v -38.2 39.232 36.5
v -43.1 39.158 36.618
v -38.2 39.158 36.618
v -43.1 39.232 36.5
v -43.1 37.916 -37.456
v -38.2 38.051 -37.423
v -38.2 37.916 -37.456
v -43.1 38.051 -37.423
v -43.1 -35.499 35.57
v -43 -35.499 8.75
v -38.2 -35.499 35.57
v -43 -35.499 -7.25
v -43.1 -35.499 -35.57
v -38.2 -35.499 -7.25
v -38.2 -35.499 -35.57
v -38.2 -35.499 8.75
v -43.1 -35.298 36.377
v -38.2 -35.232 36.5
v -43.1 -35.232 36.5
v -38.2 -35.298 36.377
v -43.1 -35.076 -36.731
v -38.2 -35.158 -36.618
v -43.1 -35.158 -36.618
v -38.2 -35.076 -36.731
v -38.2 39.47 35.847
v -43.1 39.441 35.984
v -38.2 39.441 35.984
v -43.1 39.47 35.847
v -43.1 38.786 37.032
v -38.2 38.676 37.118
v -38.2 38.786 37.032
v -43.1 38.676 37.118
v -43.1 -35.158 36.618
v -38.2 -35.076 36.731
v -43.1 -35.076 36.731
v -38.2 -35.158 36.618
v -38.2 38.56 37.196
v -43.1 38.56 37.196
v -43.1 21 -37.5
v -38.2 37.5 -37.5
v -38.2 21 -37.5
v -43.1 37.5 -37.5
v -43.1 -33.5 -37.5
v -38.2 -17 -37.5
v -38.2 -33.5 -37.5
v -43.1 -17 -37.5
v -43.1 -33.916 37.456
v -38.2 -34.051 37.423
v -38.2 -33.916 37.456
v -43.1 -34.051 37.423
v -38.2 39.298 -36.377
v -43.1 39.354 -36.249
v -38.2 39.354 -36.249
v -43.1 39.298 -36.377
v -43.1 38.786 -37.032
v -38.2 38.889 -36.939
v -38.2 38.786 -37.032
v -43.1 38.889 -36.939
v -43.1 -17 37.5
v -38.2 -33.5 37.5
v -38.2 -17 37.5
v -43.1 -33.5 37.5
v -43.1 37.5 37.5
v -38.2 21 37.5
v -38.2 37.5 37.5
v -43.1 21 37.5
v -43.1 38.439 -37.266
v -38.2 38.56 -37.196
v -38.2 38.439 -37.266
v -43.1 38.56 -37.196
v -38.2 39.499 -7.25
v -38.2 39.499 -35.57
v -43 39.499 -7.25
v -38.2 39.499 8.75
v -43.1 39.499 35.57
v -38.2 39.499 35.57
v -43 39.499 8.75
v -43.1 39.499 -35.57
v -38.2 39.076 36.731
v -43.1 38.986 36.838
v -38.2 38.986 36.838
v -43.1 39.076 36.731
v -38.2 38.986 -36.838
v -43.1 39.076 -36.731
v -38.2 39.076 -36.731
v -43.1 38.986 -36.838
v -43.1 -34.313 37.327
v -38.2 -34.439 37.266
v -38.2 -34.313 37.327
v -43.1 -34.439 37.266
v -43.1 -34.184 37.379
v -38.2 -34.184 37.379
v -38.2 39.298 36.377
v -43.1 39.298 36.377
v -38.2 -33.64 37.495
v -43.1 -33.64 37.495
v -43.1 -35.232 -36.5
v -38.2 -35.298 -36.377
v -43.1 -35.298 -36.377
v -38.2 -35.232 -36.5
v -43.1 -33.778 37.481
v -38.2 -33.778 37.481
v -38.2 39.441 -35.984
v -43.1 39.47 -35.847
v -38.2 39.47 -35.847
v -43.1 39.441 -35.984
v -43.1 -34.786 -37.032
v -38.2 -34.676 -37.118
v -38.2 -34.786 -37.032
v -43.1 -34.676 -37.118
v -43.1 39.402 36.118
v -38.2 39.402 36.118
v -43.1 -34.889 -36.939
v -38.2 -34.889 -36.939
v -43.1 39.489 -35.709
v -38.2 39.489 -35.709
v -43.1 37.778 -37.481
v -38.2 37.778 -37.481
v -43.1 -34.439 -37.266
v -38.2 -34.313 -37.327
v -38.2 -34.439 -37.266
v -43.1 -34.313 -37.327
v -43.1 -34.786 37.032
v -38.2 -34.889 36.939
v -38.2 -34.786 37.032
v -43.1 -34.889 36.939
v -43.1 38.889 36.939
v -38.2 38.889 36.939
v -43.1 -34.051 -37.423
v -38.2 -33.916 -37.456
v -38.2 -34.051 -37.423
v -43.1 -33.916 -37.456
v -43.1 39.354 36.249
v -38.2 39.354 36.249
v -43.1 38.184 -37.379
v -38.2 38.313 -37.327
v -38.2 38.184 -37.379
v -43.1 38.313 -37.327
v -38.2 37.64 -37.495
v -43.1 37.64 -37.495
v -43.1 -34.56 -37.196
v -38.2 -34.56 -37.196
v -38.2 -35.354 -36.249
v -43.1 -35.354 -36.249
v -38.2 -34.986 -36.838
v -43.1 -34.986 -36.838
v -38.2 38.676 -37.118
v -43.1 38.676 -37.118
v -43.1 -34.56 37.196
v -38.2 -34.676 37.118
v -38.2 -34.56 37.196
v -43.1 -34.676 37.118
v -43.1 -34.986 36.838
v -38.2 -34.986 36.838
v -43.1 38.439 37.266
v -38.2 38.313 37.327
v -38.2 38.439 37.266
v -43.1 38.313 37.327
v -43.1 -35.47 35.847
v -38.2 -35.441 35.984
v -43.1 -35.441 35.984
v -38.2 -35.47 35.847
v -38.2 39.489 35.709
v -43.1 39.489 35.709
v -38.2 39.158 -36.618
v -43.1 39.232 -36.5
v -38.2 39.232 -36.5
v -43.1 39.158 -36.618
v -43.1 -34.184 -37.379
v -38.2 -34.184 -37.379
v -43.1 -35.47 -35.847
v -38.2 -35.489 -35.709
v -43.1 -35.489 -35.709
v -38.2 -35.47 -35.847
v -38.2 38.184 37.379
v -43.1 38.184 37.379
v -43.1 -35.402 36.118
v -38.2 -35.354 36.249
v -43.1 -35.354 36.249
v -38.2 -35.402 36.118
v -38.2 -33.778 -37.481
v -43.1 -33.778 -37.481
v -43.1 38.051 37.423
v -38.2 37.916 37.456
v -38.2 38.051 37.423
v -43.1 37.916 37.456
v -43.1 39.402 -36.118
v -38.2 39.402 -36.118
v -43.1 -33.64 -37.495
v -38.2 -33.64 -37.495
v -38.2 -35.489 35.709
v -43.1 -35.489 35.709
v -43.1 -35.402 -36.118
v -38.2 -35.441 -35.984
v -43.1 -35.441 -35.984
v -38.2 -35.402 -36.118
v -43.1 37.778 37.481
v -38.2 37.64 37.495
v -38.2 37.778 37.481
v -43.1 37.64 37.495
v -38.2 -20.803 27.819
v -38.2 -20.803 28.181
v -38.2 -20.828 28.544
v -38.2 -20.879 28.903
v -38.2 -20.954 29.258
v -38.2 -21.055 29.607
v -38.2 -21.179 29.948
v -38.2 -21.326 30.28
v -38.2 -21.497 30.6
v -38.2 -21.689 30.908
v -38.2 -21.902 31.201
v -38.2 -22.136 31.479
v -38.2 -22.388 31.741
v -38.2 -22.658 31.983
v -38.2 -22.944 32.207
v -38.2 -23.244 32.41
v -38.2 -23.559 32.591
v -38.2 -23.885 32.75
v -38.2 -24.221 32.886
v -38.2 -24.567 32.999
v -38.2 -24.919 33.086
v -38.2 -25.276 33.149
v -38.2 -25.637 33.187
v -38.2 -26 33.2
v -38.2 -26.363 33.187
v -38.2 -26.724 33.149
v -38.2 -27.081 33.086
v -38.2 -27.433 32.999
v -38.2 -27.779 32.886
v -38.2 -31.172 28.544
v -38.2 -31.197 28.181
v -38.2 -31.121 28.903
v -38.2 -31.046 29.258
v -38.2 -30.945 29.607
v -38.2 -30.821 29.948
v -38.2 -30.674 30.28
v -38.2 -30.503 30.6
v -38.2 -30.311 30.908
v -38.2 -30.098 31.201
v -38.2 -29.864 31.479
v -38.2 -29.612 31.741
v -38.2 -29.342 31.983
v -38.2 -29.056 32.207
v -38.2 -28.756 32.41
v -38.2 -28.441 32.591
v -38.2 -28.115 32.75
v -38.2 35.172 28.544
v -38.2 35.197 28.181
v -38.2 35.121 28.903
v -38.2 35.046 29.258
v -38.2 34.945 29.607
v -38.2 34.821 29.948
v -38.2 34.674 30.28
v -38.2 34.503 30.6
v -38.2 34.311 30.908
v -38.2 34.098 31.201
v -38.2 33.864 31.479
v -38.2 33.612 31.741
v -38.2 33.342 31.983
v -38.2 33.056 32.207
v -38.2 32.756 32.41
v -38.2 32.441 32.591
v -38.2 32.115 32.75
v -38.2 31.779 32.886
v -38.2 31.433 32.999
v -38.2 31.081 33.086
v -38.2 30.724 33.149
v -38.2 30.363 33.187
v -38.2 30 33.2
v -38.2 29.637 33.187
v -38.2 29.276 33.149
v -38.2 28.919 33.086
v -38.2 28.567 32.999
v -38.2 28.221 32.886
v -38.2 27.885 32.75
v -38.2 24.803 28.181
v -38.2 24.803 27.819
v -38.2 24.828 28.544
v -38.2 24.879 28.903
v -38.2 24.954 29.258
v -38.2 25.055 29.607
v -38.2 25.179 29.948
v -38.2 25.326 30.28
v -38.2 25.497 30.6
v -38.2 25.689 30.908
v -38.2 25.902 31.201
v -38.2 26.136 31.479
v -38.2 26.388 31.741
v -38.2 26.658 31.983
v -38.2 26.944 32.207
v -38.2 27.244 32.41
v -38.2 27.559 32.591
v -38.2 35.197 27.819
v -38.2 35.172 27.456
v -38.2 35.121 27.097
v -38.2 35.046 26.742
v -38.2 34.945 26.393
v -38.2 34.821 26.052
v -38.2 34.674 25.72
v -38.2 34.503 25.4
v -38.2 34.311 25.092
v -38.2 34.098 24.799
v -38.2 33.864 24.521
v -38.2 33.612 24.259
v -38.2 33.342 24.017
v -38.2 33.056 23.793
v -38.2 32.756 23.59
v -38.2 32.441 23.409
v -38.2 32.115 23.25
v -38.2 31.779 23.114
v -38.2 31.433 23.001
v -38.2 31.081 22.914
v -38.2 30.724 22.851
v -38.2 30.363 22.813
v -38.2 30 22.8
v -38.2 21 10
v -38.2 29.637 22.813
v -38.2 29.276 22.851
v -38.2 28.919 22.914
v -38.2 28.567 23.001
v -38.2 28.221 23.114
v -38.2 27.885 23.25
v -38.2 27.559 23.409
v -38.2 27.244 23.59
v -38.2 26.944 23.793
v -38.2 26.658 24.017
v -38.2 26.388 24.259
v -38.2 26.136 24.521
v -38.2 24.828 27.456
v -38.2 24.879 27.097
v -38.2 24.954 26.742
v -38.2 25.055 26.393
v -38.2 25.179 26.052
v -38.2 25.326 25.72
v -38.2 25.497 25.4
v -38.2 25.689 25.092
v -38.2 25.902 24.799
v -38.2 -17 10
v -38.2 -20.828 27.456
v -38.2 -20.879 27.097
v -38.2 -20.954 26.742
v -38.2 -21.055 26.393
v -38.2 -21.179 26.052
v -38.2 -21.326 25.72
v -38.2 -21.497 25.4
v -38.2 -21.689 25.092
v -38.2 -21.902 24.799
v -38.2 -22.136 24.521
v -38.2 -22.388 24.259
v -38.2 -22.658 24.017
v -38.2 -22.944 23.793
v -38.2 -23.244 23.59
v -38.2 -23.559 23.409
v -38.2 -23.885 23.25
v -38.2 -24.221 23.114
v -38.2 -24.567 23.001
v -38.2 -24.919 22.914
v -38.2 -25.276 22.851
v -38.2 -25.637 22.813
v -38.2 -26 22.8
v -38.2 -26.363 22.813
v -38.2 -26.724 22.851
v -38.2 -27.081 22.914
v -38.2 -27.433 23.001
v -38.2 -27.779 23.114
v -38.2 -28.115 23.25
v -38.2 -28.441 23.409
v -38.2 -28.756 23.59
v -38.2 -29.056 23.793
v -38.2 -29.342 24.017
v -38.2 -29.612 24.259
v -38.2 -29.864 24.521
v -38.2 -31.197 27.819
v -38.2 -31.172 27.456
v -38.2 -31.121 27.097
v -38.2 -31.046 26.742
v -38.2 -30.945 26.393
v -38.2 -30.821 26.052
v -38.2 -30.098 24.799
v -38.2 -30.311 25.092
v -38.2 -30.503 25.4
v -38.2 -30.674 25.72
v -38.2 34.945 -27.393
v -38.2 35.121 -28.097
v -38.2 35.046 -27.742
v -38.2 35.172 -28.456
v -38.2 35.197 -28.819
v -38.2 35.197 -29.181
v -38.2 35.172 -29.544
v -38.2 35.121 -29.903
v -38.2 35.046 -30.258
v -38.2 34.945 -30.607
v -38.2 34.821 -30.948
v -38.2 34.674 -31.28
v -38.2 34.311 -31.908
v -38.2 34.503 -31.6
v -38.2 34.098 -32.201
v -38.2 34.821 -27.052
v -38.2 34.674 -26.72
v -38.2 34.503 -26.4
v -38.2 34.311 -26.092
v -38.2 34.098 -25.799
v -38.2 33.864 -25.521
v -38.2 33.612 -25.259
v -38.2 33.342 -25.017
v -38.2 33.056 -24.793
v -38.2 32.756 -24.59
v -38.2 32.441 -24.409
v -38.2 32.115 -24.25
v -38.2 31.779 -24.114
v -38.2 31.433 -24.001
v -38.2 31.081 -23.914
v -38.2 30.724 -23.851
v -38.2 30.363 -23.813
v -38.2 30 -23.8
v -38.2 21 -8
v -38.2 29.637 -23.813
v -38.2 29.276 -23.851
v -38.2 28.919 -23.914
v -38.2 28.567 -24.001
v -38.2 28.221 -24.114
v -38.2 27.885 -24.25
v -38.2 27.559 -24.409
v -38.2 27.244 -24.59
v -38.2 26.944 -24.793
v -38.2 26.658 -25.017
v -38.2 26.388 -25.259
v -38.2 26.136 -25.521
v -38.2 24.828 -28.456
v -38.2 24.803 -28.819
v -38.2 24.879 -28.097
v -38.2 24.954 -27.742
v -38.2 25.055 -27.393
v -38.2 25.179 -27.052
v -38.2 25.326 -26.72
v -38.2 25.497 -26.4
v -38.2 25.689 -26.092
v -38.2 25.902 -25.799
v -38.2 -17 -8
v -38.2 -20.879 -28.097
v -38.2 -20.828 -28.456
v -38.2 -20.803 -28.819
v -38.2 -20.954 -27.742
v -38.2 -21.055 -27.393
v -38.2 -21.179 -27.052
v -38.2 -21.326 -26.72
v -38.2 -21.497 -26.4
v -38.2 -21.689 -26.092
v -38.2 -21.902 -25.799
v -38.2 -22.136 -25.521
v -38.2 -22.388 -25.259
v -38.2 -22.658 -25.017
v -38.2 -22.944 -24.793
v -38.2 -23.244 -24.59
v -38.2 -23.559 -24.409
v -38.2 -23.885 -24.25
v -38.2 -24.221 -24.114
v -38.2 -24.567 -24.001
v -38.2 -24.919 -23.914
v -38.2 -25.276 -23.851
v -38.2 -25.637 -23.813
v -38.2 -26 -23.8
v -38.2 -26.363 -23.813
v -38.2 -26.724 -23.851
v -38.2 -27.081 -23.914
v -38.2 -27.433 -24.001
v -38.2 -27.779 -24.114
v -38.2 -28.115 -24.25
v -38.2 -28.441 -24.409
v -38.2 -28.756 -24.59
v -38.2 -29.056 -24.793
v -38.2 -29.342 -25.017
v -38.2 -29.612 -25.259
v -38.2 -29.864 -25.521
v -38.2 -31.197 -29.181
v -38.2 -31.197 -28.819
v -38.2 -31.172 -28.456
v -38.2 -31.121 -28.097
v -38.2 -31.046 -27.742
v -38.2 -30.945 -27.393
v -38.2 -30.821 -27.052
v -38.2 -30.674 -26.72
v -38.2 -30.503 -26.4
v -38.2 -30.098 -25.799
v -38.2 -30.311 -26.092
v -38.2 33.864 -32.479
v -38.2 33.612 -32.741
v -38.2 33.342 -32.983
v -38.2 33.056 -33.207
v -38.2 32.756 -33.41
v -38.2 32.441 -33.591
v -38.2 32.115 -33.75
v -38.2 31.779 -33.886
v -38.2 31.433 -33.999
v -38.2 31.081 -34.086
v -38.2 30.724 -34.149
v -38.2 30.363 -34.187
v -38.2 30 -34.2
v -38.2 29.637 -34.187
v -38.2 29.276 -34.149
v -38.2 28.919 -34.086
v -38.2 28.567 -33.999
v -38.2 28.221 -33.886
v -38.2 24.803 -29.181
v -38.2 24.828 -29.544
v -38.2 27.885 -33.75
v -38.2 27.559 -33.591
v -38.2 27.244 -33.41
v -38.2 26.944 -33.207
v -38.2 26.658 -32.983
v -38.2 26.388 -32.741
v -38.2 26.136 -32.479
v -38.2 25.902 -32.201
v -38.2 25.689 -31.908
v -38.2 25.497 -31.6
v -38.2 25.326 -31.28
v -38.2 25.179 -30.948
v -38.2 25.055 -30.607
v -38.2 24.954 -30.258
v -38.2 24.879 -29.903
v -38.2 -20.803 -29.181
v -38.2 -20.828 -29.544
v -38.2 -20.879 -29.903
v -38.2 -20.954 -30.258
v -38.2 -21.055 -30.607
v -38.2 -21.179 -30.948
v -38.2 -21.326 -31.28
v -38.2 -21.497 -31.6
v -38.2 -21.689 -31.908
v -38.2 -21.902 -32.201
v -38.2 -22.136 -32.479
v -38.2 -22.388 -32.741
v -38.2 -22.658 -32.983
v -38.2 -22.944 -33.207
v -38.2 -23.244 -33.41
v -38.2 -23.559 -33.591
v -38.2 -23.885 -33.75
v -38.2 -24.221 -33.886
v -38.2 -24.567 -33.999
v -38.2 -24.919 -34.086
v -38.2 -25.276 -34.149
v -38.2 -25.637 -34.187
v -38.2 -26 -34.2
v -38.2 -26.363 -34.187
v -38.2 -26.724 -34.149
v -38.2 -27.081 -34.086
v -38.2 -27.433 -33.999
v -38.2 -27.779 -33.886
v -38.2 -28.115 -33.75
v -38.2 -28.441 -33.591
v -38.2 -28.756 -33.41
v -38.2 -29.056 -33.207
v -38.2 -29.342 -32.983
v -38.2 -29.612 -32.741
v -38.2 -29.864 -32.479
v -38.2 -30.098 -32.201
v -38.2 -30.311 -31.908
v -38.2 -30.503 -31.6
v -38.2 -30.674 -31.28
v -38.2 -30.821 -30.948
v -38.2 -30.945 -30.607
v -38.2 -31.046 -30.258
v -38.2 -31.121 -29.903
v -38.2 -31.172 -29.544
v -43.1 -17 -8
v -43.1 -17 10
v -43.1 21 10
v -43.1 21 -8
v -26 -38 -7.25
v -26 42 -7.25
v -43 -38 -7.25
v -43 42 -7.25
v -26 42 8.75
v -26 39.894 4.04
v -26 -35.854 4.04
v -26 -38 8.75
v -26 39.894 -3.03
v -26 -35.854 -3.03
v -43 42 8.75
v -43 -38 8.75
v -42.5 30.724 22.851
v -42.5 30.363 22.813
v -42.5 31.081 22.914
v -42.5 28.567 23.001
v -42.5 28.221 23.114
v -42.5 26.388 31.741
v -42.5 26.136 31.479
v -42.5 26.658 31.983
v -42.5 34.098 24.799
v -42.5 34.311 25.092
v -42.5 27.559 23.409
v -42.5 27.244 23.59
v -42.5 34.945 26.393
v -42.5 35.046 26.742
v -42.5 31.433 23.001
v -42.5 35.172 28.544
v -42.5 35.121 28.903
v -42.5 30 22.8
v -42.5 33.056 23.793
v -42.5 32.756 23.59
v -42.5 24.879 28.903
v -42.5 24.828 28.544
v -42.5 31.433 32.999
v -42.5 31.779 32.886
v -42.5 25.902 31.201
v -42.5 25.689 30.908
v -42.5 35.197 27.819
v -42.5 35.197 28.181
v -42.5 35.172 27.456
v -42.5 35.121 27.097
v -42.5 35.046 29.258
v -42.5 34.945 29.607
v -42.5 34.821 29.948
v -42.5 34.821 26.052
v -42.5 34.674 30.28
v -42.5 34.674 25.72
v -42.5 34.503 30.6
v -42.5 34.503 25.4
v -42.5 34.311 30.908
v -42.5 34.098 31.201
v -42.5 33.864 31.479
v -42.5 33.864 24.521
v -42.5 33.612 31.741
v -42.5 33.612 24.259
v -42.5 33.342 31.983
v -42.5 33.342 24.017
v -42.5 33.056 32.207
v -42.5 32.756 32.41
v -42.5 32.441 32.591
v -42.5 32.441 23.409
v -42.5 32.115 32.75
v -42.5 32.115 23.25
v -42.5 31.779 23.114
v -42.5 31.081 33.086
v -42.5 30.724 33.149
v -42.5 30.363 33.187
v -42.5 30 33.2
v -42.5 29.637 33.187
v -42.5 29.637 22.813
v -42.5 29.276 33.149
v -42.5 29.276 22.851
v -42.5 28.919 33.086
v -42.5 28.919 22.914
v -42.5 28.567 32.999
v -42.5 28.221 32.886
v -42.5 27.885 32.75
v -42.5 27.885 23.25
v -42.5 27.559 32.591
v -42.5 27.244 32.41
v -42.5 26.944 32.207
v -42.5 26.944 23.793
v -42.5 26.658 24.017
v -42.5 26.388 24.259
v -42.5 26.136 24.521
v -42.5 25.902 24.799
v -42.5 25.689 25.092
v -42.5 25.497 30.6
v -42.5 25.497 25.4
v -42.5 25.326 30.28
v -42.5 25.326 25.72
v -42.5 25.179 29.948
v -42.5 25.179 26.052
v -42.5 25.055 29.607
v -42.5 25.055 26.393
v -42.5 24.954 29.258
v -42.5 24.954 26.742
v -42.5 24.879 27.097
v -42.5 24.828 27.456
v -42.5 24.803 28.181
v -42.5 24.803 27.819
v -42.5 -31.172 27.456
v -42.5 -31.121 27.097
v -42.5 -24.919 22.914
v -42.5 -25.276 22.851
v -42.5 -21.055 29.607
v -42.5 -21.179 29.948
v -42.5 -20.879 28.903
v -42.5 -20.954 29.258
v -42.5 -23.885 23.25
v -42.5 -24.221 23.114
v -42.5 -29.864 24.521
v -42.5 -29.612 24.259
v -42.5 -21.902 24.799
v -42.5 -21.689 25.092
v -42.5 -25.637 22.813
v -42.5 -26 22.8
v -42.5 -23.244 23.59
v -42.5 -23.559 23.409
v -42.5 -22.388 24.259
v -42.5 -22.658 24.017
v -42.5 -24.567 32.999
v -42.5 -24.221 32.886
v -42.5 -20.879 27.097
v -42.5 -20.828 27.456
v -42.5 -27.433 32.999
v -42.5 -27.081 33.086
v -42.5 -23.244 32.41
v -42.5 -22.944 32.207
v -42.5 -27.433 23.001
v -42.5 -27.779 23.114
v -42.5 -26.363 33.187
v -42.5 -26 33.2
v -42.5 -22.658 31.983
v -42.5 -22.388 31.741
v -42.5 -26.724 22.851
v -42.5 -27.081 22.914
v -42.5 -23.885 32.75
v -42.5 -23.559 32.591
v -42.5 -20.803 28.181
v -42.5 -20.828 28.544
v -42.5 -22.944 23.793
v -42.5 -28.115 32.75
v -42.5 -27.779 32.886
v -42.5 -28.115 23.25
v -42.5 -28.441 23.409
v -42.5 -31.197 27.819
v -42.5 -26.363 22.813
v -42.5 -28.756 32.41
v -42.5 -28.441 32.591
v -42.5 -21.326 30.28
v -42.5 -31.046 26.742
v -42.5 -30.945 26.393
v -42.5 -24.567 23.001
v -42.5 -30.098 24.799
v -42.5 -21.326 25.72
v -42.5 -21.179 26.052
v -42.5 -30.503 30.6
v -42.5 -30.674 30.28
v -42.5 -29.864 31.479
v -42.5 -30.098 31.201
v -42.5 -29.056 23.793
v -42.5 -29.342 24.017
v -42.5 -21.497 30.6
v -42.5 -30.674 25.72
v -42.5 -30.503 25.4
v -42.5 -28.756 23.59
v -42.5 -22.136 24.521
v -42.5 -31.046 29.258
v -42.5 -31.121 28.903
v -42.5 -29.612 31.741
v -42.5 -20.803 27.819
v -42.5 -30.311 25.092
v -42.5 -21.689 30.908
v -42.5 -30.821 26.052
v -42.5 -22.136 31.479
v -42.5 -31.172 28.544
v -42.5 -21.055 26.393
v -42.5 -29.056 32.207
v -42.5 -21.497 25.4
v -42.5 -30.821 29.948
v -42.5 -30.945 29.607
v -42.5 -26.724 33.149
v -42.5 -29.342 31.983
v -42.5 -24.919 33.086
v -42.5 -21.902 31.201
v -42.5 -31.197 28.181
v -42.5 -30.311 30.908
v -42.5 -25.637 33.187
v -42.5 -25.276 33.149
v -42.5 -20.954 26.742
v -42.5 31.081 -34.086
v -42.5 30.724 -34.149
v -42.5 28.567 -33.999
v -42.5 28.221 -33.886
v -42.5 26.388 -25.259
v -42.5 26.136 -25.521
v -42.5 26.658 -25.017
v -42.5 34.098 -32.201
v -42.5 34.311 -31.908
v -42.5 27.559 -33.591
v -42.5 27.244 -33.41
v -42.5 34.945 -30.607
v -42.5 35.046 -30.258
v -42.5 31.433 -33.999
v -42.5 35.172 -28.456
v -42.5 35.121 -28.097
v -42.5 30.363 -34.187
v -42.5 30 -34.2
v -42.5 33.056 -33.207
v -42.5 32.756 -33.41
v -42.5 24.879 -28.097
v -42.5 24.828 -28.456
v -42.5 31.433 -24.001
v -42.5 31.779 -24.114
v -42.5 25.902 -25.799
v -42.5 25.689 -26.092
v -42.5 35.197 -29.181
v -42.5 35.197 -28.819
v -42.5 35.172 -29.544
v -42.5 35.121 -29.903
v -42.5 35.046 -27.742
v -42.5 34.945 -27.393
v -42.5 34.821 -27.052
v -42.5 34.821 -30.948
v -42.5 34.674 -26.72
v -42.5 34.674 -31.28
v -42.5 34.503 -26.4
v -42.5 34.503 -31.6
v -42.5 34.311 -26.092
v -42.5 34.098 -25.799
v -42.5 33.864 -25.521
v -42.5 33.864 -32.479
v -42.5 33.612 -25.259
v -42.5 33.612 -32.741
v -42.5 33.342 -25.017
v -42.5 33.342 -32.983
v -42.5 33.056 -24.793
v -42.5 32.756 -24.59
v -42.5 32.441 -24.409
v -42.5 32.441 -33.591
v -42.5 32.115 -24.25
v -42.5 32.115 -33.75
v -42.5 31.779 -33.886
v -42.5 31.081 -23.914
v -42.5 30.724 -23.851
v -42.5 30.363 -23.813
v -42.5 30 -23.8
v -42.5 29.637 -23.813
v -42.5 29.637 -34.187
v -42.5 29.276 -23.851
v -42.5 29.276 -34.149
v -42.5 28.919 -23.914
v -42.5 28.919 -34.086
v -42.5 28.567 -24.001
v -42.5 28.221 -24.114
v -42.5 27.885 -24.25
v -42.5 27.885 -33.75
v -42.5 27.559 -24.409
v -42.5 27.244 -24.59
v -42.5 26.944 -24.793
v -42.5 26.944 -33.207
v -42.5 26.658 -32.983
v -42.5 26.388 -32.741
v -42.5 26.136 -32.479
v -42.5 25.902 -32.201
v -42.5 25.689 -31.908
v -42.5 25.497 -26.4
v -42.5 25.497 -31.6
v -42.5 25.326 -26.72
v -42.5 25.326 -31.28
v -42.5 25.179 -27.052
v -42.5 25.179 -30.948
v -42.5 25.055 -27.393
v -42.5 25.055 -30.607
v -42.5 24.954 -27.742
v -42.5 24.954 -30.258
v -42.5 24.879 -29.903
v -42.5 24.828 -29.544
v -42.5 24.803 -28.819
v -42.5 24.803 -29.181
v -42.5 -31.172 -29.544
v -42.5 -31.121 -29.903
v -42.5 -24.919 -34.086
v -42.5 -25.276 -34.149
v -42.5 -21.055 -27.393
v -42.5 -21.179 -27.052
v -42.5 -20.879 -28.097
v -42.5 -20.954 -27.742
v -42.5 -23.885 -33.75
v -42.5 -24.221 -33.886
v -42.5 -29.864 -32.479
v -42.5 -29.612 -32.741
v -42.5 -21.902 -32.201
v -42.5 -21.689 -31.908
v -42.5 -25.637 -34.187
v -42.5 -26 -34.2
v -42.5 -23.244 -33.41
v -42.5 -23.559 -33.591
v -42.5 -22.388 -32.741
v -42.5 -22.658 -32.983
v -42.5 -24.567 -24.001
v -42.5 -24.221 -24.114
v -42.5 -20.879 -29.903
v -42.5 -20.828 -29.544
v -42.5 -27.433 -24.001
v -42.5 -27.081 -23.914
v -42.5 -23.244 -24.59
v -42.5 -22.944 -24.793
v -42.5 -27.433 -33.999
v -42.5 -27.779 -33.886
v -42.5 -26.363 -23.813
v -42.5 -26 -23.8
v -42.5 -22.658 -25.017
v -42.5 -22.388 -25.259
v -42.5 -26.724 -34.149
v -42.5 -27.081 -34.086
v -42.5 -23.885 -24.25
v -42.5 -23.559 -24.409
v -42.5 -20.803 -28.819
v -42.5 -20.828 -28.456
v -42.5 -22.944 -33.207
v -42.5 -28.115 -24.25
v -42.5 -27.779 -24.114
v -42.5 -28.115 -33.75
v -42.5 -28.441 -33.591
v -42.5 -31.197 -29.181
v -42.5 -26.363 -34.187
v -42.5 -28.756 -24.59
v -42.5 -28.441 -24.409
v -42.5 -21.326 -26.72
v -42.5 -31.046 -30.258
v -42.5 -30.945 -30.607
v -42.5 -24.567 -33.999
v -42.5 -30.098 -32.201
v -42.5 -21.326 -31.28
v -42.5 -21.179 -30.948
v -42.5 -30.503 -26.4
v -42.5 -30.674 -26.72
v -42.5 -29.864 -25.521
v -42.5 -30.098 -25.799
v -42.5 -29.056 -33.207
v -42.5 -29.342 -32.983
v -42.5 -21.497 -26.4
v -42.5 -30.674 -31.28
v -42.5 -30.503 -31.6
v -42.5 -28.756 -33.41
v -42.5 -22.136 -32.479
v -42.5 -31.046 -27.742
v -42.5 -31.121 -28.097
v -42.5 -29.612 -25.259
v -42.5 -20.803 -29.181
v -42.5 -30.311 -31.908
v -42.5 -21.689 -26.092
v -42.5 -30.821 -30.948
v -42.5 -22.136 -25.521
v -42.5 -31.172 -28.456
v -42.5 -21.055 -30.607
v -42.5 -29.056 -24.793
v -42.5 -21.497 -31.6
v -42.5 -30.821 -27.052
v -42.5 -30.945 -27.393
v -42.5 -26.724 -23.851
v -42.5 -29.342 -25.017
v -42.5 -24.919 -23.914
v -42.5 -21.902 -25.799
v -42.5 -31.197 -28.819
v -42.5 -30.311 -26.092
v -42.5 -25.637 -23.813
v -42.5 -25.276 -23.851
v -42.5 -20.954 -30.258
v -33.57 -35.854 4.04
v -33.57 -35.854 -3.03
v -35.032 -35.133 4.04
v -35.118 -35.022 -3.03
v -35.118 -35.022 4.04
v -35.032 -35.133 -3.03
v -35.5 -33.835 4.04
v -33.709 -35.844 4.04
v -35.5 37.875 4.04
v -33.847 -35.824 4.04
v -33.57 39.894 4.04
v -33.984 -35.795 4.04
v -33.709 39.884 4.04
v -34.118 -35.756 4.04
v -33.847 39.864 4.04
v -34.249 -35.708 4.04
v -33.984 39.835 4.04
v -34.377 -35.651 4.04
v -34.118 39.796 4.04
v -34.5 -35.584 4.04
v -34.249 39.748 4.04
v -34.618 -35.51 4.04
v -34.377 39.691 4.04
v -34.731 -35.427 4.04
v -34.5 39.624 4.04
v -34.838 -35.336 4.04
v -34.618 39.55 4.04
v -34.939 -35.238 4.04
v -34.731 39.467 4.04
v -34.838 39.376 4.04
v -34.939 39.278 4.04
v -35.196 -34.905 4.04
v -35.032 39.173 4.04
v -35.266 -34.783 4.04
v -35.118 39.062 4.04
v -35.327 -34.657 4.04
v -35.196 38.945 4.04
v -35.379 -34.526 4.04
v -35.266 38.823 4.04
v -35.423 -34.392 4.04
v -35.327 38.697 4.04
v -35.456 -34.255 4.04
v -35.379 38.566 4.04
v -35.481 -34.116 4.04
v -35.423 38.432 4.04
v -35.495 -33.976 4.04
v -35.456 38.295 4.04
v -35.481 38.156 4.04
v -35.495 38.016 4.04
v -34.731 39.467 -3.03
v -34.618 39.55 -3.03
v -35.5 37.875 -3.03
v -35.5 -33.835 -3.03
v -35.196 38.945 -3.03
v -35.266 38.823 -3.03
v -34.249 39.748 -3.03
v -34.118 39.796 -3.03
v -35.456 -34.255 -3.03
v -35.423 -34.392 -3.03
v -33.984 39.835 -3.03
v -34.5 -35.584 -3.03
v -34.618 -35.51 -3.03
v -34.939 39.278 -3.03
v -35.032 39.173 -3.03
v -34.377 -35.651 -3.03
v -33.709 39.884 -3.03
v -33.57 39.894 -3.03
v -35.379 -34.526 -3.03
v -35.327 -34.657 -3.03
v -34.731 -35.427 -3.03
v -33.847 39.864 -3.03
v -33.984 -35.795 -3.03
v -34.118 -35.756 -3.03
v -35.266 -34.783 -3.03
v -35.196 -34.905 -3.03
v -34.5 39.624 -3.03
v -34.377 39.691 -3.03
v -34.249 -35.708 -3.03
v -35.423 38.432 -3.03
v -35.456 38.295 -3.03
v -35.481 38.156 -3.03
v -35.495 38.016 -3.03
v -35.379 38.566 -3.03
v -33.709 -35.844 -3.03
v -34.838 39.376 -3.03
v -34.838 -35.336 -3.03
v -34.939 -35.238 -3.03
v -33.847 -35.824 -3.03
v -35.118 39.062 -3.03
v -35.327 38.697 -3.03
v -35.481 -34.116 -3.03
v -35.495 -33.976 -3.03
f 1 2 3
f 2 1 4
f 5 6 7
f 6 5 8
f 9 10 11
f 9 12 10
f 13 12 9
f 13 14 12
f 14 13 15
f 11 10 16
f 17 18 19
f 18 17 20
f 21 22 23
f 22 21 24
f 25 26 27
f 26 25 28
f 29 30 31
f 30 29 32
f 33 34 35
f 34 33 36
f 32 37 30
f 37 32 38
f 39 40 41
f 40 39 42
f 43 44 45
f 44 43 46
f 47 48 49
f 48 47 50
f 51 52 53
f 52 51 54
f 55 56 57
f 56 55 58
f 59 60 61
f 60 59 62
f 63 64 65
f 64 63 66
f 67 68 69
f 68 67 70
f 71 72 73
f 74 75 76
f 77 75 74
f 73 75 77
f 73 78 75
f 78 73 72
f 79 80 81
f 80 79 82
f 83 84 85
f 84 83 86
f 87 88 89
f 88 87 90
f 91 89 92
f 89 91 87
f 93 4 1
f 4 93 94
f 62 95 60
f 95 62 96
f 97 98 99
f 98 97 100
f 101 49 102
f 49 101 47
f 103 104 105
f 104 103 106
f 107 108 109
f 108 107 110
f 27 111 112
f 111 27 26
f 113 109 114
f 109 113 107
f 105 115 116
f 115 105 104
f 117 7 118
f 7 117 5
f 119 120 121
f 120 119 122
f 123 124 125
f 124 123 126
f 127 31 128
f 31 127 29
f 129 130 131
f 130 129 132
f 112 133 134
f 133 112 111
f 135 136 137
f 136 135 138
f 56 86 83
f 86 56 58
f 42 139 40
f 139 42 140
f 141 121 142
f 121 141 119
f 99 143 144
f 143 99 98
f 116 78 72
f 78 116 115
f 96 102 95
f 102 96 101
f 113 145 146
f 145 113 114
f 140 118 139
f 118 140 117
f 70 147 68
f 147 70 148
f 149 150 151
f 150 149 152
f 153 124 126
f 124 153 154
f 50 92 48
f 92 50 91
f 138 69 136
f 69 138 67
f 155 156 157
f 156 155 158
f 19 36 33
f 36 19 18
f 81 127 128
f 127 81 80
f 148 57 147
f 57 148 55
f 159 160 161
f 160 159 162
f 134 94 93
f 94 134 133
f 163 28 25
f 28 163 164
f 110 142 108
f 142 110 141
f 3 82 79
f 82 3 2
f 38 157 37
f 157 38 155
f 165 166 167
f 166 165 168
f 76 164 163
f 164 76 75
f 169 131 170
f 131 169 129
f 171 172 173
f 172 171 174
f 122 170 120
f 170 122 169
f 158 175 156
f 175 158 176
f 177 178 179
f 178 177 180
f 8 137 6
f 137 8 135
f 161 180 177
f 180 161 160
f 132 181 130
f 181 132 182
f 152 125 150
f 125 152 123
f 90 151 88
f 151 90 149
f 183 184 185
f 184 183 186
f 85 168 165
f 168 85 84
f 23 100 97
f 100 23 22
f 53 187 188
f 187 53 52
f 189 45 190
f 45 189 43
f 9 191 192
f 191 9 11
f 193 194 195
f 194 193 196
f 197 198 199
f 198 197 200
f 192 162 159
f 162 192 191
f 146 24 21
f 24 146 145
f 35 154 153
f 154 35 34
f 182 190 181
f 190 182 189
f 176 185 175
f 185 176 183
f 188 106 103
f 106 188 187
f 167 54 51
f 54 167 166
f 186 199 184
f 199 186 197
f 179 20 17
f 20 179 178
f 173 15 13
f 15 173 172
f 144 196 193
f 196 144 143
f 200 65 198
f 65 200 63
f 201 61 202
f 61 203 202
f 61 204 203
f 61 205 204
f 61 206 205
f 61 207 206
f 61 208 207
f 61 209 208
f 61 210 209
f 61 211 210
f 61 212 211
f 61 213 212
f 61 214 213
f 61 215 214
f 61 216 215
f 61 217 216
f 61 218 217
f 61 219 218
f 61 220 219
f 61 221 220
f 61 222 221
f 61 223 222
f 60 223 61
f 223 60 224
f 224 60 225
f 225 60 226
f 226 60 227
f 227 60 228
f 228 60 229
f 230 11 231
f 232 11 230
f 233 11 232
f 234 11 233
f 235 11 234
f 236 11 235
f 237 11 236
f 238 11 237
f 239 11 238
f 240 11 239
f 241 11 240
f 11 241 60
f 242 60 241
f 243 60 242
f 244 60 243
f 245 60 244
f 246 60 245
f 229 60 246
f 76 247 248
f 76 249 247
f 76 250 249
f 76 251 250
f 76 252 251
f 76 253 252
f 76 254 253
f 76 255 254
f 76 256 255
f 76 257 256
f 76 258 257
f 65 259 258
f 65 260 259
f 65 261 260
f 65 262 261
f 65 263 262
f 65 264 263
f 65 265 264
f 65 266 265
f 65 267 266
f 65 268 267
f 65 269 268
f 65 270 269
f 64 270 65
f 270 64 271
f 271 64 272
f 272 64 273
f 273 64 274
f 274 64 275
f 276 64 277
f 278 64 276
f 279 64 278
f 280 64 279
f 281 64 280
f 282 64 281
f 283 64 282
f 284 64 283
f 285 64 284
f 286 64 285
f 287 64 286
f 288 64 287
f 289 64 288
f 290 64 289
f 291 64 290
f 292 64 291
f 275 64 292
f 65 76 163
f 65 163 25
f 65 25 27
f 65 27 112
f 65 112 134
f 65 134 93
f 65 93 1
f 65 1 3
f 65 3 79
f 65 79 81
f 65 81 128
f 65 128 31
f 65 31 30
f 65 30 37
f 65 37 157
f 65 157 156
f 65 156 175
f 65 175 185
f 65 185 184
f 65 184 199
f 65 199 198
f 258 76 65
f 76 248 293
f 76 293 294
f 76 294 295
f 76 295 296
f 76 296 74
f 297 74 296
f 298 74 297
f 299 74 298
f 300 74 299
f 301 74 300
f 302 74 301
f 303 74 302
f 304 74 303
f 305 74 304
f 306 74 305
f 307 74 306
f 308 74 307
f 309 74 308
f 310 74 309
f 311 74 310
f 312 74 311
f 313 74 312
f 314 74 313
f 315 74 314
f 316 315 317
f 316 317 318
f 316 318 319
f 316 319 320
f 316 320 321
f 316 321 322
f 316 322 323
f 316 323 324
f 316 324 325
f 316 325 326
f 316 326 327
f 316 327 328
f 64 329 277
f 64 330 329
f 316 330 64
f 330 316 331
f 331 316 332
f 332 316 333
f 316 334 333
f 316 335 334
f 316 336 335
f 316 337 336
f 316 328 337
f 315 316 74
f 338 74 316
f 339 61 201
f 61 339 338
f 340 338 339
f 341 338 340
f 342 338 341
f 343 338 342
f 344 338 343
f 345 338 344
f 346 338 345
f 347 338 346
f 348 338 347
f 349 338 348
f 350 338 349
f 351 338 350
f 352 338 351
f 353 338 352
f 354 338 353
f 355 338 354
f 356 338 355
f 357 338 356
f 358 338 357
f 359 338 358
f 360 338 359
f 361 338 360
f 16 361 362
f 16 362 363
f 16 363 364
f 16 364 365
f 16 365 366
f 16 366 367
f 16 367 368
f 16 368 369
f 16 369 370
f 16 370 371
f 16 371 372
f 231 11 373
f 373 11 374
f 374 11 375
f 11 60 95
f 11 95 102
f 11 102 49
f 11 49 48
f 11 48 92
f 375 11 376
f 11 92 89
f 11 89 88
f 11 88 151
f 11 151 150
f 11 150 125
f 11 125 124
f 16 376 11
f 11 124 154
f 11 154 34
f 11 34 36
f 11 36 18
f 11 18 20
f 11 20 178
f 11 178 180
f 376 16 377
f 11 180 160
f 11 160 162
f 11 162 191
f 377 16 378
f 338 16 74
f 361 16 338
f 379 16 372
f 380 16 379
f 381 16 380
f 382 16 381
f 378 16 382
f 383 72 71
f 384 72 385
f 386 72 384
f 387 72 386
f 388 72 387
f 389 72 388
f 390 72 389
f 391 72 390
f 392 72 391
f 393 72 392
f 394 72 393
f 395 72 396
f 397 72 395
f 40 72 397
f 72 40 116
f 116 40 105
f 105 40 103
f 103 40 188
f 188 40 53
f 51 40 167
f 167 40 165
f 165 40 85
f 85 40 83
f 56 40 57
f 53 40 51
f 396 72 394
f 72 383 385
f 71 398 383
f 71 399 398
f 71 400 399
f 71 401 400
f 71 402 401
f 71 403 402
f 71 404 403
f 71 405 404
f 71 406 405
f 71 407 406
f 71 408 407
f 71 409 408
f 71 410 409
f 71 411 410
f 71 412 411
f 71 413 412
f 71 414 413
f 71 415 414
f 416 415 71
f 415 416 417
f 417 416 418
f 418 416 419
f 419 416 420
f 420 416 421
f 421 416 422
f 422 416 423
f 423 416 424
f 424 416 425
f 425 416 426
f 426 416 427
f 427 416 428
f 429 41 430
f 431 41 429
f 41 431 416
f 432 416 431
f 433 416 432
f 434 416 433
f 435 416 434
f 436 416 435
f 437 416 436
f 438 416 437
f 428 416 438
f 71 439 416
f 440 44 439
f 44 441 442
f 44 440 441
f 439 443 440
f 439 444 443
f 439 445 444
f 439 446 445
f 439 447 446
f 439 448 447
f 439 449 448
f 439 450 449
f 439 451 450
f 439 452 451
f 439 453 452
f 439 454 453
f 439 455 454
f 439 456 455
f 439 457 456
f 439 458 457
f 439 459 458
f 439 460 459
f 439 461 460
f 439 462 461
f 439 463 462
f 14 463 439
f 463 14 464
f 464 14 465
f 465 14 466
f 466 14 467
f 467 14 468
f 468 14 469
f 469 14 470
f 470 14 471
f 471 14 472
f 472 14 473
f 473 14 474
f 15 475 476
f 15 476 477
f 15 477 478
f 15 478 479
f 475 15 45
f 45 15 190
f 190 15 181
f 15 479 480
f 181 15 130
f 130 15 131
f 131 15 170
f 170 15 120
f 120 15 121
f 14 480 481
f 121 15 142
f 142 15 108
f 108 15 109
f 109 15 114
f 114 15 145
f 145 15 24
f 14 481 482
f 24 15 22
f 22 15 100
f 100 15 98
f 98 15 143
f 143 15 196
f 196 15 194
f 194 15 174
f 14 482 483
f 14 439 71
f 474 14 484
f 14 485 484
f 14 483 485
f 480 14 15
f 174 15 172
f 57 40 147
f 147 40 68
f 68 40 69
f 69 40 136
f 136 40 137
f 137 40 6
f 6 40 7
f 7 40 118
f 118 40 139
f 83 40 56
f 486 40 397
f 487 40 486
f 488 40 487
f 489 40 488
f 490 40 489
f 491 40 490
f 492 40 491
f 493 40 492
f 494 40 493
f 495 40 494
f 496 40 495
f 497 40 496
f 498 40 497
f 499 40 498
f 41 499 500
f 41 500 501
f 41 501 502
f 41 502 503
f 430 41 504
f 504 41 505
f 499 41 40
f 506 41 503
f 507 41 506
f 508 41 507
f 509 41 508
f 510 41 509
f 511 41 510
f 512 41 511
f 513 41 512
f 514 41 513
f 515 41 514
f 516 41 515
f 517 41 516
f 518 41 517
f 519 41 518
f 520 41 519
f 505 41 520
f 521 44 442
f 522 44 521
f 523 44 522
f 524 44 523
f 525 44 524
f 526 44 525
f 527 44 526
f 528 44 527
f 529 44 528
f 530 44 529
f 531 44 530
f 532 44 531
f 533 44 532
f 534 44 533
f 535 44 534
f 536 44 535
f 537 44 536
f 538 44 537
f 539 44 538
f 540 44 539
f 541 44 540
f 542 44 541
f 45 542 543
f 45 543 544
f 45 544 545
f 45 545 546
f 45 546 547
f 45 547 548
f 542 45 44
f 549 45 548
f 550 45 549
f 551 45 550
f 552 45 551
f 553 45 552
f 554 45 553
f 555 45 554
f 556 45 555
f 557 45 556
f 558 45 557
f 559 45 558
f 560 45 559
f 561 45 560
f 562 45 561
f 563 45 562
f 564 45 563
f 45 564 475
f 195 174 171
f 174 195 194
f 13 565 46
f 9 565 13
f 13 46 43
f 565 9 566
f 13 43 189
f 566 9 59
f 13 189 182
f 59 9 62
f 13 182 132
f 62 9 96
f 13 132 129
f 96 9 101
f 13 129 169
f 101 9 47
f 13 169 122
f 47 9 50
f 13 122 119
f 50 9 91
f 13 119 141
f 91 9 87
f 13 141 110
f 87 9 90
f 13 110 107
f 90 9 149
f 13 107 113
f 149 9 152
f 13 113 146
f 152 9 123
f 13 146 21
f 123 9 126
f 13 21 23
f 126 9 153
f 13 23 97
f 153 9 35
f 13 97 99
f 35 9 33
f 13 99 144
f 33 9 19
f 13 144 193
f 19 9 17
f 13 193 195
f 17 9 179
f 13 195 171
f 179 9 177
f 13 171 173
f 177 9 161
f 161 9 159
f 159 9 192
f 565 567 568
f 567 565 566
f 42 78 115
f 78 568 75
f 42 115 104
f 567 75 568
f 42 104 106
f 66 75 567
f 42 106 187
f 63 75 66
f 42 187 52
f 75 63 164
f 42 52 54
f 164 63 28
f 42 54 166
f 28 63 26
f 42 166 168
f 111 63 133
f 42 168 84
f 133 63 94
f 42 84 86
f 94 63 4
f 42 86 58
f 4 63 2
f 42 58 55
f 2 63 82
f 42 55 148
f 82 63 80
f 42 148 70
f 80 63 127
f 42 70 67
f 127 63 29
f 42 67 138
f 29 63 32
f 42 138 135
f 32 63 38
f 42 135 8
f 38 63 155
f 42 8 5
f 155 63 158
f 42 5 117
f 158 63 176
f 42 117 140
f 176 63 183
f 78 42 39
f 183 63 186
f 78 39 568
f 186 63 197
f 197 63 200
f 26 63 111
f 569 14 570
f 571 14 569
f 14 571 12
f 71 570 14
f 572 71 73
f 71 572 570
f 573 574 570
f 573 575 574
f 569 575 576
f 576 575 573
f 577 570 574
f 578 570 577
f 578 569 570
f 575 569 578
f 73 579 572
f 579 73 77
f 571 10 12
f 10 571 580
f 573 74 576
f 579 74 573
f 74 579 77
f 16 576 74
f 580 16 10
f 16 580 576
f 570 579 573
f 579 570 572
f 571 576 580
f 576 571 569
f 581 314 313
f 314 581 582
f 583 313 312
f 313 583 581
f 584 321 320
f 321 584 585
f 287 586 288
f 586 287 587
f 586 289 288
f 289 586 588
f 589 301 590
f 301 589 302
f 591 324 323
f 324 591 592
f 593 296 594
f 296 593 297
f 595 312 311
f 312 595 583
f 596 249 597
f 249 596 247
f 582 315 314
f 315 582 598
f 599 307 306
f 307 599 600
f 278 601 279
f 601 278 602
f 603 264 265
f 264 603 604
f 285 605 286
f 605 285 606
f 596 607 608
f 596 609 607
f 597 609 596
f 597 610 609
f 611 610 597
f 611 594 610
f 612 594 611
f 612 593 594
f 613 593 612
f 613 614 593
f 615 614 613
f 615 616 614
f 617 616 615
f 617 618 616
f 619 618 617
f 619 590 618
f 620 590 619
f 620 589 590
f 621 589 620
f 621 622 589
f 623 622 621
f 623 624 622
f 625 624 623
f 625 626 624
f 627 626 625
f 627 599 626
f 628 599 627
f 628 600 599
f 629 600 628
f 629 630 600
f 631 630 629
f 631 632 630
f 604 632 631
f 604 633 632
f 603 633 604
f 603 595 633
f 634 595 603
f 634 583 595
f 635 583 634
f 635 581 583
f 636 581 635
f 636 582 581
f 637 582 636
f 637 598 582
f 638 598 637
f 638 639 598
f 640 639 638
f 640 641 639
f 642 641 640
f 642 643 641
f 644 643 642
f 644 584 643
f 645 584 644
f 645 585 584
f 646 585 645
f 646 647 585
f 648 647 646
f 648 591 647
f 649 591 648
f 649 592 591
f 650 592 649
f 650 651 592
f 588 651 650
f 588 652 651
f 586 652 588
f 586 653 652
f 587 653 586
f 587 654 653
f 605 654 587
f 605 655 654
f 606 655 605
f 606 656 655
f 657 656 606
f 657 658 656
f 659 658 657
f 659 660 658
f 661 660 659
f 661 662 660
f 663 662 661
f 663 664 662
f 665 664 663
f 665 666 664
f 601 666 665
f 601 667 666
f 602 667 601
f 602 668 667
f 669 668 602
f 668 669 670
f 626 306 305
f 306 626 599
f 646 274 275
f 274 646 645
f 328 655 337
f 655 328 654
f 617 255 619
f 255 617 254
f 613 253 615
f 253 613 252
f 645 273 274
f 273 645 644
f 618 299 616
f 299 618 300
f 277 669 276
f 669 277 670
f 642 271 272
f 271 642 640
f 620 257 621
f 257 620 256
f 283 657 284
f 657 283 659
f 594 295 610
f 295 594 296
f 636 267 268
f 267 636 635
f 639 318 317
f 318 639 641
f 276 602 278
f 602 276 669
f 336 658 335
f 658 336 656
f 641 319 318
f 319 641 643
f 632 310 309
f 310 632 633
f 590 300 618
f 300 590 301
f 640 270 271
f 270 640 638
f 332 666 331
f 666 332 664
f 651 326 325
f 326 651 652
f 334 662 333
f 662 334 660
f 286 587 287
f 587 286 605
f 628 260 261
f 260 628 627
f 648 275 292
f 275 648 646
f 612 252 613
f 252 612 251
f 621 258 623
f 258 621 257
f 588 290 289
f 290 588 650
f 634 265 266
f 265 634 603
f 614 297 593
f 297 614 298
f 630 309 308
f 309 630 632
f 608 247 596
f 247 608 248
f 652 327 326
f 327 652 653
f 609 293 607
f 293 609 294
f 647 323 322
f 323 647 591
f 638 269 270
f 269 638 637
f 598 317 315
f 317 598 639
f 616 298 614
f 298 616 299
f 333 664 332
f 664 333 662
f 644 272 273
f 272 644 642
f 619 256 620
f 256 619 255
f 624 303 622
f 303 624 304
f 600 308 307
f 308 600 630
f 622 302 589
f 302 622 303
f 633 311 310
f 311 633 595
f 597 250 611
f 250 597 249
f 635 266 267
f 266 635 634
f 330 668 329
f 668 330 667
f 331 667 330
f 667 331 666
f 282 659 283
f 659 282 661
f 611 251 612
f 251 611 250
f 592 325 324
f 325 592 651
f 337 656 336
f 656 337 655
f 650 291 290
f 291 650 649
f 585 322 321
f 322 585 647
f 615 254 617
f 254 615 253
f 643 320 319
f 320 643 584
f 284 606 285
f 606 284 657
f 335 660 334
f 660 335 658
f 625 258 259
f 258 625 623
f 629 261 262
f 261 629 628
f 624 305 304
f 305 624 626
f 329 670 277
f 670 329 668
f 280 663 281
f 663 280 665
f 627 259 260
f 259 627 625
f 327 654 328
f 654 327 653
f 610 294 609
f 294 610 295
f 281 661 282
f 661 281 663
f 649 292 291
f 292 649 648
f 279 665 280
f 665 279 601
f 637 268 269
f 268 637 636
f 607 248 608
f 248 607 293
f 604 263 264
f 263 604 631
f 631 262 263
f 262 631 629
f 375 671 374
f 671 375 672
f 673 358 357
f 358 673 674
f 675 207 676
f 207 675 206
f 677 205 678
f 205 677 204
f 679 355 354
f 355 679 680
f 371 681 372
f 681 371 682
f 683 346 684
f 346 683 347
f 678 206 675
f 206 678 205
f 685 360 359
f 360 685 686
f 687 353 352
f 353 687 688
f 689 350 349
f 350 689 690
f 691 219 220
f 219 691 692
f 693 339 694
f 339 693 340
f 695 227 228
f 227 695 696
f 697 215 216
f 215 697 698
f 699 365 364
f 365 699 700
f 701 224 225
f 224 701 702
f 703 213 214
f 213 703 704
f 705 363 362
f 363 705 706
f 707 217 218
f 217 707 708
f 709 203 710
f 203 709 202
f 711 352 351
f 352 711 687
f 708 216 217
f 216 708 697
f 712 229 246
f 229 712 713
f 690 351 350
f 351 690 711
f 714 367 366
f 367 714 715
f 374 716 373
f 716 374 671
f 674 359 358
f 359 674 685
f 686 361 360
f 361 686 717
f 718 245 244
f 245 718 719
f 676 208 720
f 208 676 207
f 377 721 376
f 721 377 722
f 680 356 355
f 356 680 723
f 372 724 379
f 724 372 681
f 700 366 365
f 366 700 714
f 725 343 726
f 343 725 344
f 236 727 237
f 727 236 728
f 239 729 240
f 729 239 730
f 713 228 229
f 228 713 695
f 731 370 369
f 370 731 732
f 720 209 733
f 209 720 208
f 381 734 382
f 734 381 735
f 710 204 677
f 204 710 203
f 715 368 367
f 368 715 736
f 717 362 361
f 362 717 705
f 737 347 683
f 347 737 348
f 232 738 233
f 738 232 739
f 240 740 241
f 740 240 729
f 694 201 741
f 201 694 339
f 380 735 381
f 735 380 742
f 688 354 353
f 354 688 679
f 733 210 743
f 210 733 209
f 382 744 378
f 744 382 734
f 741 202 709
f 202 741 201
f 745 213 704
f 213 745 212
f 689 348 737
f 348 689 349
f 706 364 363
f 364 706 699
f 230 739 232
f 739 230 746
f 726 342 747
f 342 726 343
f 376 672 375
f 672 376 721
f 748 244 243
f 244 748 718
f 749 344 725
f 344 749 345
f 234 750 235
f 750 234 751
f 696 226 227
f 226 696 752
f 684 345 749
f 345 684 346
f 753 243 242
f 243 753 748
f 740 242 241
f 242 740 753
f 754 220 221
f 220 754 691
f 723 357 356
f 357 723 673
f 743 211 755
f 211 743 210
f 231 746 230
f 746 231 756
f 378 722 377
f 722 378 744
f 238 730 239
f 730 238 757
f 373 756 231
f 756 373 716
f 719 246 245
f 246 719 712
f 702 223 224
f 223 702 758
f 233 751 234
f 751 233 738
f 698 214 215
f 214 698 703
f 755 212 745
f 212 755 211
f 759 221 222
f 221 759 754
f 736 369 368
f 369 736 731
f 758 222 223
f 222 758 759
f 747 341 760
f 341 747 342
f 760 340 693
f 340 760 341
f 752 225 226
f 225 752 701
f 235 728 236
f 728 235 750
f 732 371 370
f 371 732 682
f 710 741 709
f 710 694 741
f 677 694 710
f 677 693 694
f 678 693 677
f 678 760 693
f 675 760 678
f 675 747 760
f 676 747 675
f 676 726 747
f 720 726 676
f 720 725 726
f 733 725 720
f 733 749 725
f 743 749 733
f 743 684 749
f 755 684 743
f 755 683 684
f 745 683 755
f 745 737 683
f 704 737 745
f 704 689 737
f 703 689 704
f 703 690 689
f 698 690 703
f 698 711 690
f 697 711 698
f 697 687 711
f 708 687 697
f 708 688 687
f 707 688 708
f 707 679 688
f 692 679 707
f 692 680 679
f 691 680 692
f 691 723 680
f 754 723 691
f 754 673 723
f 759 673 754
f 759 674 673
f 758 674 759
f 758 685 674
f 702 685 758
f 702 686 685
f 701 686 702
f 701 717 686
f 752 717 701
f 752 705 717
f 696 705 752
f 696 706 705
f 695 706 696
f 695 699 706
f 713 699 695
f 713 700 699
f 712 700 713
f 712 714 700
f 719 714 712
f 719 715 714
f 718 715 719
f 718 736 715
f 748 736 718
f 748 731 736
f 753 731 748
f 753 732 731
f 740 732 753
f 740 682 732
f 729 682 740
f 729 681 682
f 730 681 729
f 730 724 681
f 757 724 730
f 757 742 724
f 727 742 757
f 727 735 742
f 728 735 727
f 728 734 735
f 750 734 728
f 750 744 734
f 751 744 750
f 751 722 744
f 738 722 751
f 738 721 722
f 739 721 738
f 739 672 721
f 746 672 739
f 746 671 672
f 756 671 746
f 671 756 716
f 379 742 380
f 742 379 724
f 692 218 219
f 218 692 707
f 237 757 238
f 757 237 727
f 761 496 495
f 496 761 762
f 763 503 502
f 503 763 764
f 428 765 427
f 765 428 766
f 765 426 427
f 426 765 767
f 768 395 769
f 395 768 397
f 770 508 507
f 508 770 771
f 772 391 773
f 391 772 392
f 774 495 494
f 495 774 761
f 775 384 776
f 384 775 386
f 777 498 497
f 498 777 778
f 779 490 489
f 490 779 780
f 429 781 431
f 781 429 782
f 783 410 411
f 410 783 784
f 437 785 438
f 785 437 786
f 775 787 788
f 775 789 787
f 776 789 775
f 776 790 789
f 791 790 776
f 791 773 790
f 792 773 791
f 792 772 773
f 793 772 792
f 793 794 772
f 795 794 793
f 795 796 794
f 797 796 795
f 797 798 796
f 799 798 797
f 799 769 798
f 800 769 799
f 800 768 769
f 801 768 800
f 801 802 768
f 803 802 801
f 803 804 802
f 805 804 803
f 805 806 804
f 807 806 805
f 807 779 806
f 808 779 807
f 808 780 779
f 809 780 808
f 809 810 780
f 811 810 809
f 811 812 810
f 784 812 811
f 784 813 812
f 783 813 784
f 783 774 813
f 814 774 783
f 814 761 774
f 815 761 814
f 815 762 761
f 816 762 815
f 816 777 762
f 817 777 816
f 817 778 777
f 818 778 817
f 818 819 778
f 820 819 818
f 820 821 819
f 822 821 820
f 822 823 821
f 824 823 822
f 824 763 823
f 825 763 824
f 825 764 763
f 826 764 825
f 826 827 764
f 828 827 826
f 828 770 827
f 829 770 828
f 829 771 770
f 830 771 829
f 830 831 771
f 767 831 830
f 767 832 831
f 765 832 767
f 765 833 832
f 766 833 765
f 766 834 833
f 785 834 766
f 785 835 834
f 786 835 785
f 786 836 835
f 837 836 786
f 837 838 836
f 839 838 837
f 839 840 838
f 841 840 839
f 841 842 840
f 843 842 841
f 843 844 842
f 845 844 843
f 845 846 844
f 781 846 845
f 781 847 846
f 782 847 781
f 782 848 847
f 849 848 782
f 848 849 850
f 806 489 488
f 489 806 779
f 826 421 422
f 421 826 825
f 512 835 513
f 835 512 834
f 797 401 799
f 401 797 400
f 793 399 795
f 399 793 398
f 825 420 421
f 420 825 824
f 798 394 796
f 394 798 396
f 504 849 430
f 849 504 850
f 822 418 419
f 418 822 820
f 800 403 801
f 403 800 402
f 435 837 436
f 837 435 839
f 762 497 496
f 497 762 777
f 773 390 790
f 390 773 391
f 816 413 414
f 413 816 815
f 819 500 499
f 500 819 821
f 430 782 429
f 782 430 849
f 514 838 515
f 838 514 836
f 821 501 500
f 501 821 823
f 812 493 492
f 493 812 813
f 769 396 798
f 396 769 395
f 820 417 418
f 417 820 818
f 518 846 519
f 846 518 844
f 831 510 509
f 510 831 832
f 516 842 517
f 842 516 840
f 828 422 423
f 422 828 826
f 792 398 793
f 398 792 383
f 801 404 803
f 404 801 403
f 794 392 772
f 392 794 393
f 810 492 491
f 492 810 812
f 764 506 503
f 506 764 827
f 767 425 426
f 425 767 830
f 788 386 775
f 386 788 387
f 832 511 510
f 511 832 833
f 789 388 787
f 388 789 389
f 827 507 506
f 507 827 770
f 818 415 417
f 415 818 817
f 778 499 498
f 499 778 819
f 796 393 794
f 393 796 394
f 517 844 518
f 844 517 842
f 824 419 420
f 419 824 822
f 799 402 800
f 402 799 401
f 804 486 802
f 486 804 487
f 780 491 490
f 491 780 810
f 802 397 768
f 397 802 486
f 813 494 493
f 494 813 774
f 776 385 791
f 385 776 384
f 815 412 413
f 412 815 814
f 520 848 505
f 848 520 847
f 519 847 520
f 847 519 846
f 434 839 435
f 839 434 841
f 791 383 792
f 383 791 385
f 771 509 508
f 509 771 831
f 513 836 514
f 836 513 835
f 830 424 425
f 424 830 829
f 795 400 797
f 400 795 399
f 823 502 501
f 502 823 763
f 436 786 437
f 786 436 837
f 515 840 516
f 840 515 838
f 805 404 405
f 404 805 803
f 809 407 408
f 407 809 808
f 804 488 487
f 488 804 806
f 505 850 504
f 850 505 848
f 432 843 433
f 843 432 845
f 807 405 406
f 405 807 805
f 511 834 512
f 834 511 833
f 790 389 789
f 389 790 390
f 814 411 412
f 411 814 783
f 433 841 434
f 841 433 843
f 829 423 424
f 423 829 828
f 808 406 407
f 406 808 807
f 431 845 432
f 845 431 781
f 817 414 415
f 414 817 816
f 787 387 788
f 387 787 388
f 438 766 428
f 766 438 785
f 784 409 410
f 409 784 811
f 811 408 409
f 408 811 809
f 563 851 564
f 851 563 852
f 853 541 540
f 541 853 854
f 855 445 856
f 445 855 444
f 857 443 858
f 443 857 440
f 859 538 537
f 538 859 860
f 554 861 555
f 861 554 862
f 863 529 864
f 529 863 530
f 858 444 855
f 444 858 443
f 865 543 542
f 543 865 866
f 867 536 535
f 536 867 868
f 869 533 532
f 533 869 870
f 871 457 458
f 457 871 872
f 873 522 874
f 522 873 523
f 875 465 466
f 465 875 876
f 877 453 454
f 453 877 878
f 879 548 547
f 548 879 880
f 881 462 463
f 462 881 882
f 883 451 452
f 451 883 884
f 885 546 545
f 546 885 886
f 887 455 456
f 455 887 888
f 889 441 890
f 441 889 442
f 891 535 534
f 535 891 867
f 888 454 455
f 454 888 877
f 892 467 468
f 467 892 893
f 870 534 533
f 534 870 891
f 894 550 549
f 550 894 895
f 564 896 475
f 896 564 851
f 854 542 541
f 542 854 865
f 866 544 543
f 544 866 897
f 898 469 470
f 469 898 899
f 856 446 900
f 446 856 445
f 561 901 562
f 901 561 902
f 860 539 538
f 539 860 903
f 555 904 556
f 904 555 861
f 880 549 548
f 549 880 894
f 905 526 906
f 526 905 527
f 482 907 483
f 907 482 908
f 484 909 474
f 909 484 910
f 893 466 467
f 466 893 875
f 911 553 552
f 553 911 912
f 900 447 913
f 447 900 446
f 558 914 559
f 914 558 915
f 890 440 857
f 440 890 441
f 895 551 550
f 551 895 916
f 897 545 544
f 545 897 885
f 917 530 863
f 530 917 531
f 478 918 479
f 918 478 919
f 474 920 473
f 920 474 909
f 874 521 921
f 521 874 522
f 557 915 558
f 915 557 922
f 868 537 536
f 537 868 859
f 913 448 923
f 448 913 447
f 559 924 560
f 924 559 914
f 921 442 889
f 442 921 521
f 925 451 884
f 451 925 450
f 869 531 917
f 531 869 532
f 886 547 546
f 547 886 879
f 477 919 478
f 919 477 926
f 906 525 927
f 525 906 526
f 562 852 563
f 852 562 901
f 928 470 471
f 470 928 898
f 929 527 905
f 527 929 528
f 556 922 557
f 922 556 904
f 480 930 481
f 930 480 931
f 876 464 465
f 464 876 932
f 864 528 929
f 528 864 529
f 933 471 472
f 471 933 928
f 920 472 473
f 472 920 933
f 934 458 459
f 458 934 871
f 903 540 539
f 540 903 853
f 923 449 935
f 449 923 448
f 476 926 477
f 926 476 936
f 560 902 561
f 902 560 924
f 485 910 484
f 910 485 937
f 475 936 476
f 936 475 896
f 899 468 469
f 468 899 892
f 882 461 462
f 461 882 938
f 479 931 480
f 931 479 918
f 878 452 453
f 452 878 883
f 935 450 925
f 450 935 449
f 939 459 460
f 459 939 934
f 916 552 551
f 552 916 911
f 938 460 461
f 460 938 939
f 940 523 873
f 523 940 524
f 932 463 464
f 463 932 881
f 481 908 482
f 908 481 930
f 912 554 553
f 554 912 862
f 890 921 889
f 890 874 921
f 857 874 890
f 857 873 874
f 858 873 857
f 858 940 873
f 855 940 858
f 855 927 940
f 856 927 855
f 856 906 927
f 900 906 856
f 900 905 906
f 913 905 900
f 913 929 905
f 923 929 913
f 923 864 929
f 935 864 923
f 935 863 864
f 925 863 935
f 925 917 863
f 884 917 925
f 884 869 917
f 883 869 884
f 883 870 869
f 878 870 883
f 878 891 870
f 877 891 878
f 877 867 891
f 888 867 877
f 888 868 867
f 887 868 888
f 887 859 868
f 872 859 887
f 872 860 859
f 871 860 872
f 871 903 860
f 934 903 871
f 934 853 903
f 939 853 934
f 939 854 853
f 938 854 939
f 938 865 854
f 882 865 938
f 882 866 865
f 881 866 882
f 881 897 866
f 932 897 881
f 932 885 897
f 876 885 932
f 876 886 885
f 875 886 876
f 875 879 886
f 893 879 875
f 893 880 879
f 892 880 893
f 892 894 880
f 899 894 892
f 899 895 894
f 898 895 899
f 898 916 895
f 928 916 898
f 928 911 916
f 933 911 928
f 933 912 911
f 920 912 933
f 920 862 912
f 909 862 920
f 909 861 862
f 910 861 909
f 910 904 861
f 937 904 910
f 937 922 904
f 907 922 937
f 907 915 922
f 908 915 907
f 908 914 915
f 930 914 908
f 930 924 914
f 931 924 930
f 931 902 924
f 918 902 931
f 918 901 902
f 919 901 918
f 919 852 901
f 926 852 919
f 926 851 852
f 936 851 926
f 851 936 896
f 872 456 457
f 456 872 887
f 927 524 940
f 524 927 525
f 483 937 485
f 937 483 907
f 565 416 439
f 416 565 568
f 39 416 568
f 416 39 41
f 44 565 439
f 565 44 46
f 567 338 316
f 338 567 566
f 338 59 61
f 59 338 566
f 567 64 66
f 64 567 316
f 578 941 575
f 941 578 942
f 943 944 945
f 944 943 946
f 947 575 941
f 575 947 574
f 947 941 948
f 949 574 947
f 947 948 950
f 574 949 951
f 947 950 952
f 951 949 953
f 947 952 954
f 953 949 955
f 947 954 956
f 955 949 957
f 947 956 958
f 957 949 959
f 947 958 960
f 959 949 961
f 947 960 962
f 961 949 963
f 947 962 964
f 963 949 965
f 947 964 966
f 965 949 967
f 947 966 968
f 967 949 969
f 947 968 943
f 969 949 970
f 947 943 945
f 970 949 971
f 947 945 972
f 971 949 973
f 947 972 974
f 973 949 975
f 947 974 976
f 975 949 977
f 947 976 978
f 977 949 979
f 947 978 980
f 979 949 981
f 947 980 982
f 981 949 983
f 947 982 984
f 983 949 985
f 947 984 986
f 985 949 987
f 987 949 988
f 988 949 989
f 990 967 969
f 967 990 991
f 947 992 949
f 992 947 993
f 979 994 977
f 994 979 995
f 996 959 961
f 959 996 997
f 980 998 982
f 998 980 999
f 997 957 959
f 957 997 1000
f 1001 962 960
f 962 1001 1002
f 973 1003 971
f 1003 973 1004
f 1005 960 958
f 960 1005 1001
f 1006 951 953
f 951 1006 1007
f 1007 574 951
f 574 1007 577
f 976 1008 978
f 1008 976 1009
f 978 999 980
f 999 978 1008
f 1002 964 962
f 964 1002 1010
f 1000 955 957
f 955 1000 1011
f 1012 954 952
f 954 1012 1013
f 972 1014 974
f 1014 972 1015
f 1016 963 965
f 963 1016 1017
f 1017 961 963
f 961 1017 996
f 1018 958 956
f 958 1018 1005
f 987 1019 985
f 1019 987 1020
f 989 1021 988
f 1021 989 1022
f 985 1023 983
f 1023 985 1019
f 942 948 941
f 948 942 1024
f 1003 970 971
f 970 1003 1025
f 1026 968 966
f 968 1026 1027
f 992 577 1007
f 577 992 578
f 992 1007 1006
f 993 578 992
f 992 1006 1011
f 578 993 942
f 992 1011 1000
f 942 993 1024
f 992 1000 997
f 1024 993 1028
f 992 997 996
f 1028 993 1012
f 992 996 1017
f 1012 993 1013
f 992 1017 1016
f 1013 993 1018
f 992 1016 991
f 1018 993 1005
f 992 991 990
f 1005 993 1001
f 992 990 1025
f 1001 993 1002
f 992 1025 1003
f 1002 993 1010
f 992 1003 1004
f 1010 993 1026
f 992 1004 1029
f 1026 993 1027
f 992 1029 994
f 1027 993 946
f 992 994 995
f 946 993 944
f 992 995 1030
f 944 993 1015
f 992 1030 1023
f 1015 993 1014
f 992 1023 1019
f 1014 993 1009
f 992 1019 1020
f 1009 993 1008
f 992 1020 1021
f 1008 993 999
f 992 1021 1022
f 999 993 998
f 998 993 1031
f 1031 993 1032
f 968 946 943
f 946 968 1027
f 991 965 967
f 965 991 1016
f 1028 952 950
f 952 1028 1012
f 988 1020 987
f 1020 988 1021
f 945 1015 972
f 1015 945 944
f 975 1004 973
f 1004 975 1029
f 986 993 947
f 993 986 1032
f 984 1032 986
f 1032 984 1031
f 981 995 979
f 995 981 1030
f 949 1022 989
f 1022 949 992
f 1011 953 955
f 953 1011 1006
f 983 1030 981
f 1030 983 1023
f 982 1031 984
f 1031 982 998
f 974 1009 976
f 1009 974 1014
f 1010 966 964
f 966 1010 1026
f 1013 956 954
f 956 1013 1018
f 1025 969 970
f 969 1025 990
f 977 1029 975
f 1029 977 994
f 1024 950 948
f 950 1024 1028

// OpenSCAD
$fn = 90;

tile_thickness = 7;
tile_size = 75;
magnet_d = 10.4;
magnet_h = 10;


difference() {
    mount();
    scale([1, 1.01, 1.01]) tile();
}

module mount() {
    translate([-40, 0, 0]) {
        difference() {
            rotate([0, 90, 0]) {
                translate([-2, 0, -1]) scale([1, 1, 0.7]) tile();
                translate([-8.75, -(tile_size / 2) + -0.5, -3]) cube([16, tile_size + 5, 17]);
            }
            translate([-2.5, 30, 28]) rotate([0, 90, 0]) magnet();
            translate([-2.5, -26, 28]) rotate([0, 90, 0]) magnet();
            translate([-2.5, 30, -29]) rotate([0, 90, 0]) magnet();
            translate([-2.5, -26, -29]) rotate([0, 90, 0]) magnet();
            translate([-5, -17, -8]) rotate([0, 90, 0]) cube([30, 38, 20]);
            translate([-5, -17, 40]) rotate([0, 90, 0]) cube([30, 38, 20]);
        }
    }
}

module tile() {
    rounded_edge = 2;
    translate([rounded_edge, rounded_edge, 0]) 
        minkowski() {
            cube([tile_size - rounded_edge * 2, tile_size - rounded_edge * 2, tile_thickness - 1], true);
            cylinder(h = 1, r = rounded_edge);
        }
}

module magnet() {
    cylinder(h = magnet_h, d = magnet_d);
}
